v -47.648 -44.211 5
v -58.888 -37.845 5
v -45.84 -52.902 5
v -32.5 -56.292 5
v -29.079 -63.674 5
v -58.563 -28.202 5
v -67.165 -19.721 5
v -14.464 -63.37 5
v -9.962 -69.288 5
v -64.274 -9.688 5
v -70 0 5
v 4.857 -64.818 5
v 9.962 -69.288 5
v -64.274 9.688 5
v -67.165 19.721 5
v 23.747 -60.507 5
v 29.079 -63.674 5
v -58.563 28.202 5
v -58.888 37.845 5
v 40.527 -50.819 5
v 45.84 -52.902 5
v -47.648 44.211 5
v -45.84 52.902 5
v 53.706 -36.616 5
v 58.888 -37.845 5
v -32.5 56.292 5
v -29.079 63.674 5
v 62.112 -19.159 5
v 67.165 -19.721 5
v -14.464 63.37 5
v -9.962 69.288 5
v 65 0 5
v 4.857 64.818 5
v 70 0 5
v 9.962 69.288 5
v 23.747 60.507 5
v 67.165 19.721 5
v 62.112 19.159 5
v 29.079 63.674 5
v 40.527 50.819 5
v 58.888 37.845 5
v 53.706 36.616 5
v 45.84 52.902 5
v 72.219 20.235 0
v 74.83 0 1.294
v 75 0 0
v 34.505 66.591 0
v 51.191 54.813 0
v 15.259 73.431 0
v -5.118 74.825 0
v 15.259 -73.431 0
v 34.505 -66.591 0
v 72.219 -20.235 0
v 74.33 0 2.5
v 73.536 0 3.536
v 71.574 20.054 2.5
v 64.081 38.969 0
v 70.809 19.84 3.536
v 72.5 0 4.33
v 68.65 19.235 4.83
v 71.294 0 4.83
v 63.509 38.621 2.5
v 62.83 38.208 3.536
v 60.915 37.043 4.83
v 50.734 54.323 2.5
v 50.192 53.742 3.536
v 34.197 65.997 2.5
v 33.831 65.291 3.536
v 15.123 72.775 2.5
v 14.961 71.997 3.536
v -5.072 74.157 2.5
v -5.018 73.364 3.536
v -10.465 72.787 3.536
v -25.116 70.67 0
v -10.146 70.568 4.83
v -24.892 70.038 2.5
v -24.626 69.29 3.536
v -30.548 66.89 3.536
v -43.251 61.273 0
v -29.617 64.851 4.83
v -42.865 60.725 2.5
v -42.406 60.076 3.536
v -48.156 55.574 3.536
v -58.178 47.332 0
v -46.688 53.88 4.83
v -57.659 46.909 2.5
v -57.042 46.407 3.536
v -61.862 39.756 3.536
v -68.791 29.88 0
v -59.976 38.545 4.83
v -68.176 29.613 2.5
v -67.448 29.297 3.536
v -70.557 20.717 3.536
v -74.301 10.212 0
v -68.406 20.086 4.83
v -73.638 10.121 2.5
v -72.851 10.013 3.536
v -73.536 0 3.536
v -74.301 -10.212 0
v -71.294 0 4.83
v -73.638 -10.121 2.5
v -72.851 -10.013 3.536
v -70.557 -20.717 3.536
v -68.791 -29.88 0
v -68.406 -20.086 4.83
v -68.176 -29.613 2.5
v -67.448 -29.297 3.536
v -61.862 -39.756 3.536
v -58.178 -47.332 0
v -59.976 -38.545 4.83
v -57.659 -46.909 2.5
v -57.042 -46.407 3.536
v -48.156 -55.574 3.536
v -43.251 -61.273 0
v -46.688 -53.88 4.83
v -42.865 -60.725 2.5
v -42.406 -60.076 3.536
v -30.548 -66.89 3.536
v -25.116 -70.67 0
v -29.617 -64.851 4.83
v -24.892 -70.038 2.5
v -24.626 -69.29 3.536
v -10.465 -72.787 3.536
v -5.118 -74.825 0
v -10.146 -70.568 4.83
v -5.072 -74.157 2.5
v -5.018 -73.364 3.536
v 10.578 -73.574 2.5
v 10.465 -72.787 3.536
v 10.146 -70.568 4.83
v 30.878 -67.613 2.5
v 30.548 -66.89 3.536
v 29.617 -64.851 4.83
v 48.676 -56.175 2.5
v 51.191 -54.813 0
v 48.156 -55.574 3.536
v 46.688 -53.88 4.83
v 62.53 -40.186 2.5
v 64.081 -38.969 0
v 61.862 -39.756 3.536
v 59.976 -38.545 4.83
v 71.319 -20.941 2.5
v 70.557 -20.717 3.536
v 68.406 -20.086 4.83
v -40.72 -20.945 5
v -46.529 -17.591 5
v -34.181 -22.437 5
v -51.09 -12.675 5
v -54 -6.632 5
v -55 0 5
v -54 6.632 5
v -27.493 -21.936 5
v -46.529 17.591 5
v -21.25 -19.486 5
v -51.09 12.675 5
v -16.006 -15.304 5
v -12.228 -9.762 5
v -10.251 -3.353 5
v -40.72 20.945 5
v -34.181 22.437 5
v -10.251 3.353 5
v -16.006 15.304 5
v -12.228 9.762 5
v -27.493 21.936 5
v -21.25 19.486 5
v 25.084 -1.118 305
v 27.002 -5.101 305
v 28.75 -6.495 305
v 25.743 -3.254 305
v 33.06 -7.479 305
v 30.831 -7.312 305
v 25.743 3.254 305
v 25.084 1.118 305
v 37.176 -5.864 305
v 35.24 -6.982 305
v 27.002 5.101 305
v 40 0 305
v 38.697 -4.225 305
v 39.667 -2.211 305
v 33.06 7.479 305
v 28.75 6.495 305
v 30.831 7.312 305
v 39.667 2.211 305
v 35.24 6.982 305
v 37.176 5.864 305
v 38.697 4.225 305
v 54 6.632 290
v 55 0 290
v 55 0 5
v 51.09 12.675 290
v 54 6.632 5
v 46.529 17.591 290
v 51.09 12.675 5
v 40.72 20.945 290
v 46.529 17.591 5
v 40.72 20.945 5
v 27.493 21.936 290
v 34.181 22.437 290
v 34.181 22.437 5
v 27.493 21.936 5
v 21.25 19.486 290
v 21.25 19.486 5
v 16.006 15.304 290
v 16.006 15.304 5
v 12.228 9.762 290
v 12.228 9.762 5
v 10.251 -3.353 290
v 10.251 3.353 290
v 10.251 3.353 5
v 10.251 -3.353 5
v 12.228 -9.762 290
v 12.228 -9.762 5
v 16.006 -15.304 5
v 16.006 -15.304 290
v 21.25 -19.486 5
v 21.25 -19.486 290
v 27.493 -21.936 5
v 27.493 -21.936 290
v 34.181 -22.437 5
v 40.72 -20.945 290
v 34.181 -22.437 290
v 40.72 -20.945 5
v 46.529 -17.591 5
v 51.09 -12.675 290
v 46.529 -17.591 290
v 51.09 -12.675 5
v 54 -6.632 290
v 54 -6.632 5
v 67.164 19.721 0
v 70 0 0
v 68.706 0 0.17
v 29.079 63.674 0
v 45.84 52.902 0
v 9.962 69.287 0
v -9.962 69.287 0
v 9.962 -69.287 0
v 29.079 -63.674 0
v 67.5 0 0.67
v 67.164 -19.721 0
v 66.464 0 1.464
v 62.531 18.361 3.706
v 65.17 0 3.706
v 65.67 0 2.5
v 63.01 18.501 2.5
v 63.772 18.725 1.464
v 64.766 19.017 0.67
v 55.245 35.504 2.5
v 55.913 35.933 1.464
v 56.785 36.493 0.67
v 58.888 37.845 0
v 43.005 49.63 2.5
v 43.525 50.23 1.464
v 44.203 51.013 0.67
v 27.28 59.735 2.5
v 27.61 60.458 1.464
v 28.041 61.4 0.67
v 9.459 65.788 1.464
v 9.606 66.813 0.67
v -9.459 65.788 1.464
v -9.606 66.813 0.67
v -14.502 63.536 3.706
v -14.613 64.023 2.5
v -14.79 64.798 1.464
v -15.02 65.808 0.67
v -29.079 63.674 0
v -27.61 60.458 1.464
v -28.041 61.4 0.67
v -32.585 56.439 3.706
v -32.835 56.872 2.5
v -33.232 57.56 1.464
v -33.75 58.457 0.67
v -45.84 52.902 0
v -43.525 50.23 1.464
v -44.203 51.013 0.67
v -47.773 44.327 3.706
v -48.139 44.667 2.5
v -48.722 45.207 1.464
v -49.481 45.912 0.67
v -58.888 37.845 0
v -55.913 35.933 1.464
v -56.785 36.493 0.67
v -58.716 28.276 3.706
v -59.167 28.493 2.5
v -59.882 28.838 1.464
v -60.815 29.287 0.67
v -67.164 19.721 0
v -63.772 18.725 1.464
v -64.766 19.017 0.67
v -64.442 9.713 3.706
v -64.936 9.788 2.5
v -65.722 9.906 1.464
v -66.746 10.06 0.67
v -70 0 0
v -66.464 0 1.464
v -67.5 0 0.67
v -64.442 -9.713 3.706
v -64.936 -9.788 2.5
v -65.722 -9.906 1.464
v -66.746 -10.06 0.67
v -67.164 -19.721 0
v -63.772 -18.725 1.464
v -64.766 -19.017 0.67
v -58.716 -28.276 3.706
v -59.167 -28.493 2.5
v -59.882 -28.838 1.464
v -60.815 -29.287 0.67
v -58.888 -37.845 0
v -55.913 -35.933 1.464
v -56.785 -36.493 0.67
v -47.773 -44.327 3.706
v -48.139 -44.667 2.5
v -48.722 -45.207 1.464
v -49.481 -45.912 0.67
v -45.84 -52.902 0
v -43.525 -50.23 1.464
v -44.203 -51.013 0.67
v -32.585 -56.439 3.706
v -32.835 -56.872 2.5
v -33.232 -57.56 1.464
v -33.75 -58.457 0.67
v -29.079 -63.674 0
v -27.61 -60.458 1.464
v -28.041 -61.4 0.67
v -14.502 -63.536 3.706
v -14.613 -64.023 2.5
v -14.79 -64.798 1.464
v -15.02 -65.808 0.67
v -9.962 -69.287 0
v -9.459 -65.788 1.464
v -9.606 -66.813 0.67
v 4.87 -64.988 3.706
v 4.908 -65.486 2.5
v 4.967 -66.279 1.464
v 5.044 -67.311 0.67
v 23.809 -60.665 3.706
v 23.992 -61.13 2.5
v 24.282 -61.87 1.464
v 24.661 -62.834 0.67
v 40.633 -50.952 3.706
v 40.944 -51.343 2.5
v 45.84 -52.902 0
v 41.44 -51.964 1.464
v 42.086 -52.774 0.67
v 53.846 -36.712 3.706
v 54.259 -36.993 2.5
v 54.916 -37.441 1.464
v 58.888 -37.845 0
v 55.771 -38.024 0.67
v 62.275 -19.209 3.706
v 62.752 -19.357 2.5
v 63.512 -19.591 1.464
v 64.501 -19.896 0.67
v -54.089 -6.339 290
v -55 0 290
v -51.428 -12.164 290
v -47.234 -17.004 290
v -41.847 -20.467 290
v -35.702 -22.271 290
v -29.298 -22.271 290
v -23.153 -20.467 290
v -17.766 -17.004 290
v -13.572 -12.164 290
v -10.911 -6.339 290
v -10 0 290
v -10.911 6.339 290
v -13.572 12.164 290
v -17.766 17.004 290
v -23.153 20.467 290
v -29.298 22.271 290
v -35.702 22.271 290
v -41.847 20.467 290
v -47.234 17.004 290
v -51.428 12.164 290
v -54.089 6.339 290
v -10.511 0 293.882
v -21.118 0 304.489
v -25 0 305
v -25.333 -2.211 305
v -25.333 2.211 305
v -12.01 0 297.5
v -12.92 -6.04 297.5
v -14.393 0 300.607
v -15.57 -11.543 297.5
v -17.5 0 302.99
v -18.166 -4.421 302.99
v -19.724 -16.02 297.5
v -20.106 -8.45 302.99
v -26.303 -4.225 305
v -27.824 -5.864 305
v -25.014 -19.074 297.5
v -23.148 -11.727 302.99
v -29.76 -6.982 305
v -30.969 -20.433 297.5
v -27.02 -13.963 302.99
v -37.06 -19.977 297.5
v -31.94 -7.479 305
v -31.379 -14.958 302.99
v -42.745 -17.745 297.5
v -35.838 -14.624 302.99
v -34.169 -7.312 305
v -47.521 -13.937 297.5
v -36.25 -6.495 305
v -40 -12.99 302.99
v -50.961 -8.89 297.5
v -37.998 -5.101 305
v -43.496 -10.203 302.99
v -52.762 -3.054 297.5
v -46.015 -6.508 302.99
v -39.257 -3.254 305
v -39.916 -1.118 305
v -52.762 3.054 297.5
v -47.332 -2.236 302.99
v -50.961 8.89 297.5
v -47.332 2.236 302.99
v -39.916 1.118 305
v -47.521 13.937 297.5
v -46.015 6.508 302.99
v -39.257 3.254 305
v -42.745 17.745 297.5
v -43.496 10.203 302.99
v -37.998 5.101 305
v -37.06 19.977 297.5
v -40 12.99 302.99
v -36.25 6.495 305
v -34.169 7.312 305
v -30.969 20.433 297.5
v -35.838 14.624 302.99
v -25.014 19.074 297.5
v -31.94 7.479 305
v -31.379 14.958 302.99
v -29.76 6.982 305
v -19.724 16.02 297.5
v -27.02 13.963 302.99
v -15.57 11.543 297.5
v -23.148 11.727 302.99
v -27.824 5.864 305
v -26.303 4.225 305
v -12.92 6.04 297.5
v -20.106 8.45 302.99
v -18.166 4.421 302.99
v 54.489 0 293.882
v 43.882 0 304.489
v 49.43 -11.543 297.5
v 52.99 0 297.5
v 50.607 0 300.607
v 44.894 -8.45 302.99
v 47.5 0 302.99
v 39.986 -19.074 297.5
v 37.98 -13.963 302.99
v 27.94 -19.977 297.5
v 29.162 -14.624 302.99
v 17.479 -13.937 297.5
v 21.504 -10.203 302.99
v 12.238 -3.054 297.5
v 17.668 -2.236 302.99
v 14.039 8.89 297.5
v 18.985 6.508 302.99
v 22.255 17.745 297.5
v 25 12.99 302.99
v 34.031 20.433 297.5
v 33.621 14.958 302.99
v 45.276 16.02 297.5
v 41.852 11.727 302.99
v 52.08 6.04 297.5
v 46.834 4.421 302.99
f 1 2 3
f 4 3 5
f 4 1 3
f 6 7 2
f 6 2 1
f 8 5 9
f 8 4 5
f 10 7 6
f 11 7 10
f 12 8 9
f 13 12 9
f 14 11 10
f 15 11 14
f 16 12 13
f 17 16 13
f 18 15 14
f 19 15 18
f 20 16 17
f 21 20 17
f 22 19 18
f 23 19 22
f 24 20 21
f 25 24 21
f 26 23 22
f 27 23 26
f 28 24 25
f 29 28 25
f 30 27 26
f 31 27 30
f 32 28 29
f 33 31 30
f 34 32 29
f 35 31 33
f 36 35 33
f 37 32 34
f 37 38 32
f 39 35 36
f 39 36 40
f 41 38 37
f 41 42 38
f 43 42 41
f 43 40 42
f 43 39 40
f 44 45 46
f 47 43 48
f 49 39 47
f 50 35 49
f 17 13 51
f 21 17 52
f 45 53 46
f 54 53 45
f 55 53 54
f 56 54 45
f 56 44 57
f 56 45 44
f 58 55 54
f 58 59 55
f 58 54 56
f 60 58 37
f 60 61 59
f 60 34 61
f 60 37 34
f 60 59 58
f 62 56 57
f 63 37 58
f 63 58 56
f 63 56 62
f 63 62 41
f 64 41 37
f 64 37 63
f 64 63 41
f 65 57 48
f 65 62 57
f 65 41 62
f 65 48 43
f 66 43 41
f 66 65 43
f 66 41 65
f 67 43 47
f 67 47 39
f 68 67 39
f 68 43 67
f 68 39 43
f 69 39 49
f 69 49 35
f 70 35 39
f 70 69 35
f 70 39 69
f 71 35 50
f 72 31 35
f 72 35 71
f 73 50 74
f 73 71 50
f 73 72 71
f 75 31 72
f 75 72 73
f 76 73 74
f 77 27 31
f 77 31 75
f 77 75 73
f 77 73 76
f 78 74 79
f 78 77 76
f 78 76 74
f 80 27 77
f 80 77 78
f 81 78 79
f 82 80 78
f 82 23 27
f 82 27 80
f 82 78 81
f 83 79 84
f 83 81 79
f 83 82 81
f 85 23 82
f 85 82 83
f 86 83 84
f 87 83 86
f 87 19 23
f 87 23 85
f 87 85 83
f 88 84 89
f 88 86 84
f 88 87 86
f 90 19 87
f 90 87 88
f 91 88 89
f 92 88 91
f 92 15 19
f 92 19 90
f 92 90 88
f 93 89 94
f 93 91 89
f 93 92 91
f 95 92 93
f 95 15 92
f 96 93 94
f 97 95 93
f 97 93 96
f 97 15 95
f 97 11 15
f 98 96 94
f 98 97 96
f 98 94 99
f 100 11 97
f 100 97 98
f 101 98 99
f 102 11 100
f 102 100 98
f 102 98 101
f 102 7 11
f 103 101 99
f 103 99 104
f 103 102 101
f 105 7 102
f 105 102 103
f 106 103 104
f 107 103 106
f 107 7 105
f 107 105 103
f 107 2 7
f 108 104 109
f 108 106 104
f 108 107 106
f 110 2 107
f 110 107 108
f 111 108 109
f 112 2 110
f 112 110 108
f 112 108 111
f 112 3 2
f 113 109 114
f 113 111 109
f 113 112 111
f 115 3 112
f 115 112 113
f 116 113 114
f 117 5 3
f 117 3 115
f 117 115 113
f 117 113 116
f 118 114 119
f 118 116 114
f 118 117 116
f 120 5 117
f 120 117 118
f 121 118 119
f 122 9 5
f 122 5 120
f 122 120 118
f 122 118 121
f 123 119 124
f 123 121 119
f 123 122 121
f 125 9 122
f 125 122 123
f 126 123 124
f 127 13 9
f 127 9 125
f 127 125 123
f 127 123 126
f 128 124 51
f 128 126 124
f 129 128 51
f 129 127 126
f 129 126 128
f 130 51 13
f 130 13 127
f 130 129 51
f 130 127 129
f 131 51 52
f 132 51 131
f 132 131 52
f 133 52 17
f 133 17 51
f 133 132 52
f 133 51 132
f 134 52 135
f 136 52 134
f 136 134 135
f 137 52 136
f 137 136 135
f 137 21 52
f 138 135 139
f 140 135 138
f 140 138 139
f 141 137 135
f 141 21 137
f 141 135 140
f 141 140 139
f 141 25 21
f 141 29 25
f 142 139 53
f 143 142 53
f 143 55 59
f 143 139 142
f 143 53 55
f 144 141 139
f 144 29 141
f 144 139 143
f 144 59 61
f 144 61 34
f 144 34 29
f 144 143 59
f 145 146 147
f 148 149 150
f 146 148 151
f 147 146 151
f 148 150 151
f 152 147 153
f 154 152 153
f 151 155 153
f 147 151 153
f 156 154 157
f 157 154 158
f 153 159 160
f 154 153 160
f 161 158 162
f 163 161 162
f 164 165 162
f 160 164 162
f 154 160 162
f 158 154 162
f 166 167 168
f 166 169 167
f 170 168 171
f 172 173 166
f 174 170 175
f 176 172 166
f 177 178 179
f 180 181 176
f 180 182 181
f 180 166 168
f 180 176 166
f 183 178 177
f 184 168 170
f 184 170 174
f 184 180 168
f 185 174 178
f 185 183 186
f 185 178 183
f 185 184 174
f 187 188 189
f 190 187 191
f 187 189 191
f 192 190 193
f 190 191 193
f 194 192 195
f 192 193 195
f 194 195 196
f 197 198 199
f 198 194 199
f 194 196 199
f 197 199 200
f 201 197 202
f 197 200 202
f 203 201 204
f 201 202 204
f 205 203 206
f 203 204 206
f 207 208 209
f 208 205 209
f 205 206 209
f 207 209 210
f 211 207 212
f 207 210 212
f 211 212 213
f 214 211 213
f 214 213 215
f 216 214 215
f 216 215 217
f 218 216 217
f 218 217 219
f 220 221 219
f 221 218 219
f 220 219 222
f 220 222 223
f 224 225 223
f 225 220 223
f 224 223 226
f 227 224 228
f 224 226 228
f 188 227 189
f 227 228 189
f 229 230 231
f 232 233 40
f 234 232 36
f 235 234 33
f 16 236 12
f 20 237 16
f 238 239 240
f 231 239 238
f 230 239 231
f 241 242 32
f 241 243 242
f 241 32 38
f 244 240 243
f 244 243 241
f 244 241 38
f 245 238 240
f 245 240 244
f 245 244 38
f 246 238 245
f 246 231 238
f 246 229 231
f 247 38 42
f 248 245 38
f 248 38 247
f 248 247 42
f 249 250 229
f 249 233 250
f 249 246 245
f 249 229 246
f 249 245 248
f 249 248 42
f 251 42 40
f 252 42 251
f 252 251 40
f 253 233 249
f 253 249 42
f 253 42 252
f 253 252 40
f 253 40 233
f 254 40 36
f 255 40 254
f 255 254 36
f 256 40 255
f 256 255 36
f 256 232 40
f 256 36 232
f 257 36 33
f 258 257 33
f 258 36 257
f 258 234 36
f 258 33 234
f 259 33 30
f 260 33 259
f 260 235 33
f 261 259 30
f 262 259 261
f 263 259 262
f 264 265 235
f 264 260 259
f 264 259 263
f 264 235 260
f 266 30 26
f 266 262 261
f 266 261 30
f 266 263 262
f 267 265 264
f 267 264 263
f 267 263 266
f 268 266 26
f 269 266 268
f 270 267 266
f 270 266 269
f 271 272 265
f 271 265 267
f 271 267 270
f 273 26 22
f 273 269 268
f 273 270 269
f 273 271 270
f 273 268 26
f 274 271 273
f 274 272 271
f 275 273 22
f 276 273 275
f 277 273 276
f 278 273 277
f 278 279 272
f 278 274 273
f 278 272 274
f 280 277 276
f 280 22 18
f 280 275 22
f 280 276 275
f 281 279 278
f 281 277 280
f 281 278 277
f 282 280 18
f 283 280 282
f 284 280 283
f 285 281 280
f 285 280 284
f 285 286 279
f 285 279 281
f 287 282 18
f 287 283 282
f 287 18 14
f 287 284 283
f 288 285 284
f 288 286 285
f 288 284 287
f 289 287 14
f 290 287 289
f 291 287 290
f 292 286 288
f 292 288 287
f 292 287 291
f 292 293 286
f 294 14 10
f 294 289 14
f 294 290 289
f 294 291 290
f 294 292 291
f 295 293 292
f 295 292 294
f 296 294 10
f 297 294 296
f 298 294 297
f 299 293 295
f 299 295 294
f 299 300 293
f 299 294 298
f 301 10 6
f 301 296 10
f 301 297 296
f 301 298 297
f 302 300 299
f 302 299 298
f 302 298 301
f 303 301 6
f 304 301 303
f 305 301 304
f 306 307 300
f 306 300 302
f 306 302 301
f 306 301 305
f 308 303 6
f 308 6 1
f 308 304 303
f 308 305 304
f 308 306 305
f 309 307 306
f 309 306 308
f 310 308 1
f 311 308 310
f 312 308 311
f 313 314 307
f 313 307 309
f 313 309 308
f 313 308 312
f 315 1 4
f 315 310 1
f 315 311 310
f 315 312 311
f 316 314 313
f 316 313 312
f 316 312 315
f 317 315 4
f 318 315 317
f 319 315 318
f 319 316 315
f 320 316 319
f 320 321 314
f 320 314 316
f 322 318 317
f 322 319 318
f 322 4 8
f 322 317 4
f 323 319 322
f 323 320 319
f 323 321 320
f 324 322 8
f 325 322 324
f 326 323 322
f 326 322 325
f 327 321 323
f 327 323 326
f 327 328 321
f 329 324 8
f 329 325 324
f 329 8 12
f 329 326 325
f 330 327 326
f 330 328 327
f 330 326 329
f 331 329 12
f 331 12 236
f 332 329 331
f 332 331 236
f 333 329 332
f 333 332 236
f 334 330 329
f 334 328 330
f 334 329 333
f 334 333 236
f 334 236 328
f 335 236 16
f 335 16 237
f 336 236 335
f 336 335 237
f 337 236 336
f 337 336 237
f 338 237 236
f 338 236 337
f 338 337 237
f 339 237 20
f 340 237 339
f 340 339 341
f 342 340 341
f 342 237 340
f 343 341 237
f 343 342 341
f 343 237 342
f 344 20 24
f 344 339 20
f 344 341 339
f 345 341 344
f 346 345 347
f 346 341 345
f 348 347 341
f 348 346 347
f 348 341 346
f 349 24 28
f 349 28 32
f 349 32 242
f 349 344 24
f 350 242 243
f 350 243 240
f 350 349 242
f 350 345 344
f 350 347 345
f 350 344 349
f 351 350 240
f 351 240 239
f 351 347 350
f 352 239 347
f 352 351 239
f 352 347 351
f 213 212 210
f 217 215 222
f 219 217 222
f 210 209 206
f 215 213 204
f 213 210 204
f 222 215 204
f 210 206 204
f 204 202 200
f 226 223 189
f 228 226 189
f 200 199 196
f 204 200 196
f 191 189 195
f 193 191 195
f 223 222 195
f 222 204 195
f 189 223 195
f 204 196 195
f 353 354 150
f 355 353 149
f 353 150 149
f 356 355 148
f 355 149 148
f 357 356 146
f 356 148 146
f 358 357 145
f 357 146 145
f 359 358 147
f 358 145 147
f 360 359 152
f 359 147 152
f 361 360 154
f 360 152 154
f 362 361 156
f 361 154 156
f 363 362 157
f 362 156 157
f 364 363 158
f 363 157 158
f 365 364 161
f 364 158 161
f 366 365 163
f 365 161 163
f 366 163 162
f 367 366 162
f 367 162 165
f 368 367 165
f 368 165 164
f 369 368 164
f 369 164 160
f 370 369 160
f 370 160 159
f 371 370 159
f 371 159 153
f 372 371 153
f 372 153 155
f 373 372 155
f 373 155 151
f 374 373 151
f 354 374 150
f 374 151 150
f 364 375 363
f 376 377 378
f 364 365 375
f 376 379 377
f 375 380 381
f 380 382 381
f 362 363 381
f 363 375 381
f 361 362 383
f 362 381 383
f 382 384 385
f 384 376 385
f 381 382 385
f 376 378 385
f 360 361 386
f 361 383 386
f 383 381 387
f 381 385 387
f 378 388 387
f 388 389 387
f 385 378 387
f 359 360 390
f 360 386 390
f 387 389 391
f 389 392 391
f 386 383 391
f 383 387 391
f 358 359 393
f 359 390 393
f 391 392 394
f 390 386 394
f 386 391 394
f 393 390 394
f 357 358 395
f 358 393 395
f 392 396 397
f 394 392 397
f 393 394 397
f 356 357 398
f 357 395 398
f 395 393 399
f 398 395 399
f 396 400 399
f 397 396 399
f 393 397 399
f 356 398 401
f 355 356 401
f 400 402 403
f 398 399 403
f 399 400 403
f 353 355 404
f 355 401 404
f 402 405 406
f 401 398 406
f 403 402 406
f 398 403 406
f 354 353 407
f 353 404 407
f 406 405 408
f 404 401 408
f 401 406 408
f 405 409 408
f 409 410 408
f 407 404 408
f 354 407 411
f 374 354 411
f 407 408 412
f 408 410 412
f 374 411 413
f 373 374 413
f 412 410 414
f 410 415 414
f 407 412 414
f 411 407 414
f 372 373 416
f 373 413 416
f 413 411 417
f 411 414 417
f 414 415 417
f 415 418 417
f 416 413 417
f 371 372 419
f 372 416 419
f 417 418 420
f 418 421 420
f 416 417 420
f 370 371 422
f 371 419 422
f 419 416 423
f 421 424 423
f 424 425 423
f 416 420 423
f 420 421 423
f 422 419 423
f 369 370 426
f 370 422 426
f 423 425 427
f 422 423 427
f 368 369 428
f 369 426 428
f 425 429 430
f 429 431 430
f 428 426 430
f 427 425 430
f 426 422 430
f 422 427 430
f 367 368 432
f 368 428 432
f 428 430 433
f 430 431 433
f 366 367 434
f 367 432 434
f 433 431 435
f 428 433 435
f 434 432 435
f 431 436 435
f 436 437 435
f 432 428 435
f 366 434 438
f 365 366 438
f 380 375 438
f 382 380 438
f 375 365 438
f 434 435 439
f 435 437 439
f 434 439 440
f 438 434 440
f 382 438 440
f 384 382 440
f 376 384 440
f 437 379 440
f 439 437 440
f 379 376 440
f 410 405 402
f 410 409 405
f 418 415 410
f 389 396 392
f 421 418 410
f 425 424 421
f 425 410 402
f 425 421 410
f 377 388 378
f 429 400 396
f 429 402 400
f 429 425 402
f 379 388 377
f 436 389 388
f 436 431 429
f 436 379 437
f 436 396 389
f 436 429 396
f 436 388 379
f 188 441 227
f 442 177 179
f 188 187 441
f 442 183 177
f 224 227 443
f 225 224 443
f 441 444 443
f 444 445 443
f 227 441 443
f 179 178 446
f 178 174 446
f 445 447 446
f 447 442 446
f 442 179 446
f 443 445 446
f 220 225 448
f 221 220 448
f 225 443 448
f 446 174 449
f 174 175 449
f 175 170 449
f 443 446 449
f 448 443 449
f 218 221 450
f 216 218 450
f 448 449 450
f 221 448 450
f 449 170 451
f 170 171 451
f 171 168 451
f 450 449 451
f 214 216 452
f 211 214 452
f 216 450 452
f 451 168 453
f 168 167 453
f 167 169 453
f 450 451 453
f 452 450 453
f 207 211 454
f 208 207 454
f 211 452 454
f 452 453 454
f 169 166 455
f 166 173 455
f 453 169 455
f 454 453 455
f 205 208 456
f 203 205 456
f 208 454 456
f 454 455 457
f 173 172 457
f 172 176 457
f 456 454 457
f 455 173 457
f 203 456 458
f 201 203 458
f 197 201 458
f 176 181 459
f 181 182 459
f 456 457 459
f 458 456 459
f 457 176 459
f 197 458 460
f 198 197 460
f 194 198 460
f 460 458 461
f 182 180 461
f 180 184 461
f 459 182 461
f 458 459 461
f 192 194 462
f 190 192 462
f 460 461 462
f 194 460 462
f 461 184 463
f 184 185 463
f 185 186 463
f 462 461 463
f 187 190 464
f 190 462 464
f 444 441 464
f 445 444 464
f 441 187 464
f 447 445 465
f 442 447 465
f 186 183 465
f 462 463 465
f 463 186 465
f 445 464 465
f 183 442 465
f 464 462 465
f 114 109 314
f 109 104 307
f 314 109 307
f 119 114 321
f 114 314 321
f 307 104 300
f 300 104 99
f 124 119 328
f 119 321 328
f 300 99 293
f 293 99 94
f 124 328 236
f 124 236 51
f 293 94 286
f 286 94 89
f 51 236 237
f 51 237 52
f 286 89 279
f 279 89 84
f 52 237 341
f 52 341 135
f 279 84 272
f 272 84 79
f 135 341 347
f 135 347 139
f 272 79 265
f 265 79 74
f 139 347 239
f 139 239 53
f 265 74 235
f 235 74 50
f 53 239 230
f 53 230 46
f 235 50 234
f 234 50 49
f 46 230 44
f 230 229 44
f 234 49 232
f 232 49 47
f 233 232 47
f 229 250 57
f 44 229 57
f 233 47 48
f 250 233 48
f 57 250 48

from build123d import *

# Parameters (mm, degrees)
F0_R     = 75
F0_R_2   = 65
F1_DEPTH = 5
F2_R     = 4.99999
F4_DEPTH = 300


# Not quite as in the source:
# - a fillet or chamfer that OpenCascade refuses, or shapes differently, is made with other operations: its cross-section is extruded or revolved along the edge and cut away or added
# - a fillet or chamfer is up to 0.001 mm smaller than in the source, because OpenCascade refuses the exact size


with BuildPart() as f1:
    # F0 (on Top) → F1 (new body)
    with BuildSketch(Plane.XY):
        Circle(F0_R)
        Circle(F0_R_2, mode=Mode.SUBTRACT)
    extrude(amount=F1_DEPTH)

    # F2 (radius 5 in the source; OpenCascade refuses exactly that, so slightly less here)
    f2_edges = [f1.edges().sort_by_distance(p)[0] for p in [
        (-75, 0, 5),
        (-65, 0, 0),
    ]]
    fillet(f2_edges, radius=F2_R)


with BuildPart() as f4:
    # F3 (on face) → F4 (new body)
    with BuildSketch(Plane.XY.offset(5)):
        with BuildLine():
            ThreePointArc((-10, 0), (-32.5, 22.5), (-55, 0))
            ThreePointArc((-55, 0), (-32.5, -22.5), (-10, 0))
        make_face()
    extrude(amount=F4_DEPTH)

    # F5: fillet of radius 15 on 1 edges, made by hand

    # F5_s1 → F5_t2 (revolve, cut)
    with BuildSketch(Plane.XZ):
        with BuildLine():
            ThreePointArc((-10, 290), (-14.3933982822, 300.6066017178), (-25, 305))
            Line((-25, 305), (-10, 305))
            Line((-10, 305), (-10, 290))
        make_face()
    revolve(axis=Axis((-32.5, 0, 305), (0, 0, -1)), mode=Mode.SUBTRACT)


with BuildPart() as f4b:
    # F3 (on face) → F4, piece 2 (new body)
    with BuildSketch(Plane.XY.offset(5)):
        with BuildLine():
            ThreePointArc((10, 0), (32.5, -22.5), (55, 0))
            ThreePointArc((55, 0), (32.5, 22.5), (10, 0))
        make_face()
    extrude(amount=F4_DEPTH)

    # F5#2: fillet of radius 15 on 1 edges, made by hand

    # F5_2_s1 → F5_2_t2 (revolve, cut)
    with BuildSketch(Plane.XZ):
        with BuildLine():
            ThreePointArc((55, 290), (50.6066017178, 300.6066017178), (40, 305))
            Line((40, 305), (55, 305))
            Line((55, 305), (55, 290))
        make_face()
    revolve(axis=Axis((32.5, 0, 305), (0, 0, -1)), mode=Mode.SUBTRACT)


solid = Compound([f1.part, f4.part, f4b.part])
